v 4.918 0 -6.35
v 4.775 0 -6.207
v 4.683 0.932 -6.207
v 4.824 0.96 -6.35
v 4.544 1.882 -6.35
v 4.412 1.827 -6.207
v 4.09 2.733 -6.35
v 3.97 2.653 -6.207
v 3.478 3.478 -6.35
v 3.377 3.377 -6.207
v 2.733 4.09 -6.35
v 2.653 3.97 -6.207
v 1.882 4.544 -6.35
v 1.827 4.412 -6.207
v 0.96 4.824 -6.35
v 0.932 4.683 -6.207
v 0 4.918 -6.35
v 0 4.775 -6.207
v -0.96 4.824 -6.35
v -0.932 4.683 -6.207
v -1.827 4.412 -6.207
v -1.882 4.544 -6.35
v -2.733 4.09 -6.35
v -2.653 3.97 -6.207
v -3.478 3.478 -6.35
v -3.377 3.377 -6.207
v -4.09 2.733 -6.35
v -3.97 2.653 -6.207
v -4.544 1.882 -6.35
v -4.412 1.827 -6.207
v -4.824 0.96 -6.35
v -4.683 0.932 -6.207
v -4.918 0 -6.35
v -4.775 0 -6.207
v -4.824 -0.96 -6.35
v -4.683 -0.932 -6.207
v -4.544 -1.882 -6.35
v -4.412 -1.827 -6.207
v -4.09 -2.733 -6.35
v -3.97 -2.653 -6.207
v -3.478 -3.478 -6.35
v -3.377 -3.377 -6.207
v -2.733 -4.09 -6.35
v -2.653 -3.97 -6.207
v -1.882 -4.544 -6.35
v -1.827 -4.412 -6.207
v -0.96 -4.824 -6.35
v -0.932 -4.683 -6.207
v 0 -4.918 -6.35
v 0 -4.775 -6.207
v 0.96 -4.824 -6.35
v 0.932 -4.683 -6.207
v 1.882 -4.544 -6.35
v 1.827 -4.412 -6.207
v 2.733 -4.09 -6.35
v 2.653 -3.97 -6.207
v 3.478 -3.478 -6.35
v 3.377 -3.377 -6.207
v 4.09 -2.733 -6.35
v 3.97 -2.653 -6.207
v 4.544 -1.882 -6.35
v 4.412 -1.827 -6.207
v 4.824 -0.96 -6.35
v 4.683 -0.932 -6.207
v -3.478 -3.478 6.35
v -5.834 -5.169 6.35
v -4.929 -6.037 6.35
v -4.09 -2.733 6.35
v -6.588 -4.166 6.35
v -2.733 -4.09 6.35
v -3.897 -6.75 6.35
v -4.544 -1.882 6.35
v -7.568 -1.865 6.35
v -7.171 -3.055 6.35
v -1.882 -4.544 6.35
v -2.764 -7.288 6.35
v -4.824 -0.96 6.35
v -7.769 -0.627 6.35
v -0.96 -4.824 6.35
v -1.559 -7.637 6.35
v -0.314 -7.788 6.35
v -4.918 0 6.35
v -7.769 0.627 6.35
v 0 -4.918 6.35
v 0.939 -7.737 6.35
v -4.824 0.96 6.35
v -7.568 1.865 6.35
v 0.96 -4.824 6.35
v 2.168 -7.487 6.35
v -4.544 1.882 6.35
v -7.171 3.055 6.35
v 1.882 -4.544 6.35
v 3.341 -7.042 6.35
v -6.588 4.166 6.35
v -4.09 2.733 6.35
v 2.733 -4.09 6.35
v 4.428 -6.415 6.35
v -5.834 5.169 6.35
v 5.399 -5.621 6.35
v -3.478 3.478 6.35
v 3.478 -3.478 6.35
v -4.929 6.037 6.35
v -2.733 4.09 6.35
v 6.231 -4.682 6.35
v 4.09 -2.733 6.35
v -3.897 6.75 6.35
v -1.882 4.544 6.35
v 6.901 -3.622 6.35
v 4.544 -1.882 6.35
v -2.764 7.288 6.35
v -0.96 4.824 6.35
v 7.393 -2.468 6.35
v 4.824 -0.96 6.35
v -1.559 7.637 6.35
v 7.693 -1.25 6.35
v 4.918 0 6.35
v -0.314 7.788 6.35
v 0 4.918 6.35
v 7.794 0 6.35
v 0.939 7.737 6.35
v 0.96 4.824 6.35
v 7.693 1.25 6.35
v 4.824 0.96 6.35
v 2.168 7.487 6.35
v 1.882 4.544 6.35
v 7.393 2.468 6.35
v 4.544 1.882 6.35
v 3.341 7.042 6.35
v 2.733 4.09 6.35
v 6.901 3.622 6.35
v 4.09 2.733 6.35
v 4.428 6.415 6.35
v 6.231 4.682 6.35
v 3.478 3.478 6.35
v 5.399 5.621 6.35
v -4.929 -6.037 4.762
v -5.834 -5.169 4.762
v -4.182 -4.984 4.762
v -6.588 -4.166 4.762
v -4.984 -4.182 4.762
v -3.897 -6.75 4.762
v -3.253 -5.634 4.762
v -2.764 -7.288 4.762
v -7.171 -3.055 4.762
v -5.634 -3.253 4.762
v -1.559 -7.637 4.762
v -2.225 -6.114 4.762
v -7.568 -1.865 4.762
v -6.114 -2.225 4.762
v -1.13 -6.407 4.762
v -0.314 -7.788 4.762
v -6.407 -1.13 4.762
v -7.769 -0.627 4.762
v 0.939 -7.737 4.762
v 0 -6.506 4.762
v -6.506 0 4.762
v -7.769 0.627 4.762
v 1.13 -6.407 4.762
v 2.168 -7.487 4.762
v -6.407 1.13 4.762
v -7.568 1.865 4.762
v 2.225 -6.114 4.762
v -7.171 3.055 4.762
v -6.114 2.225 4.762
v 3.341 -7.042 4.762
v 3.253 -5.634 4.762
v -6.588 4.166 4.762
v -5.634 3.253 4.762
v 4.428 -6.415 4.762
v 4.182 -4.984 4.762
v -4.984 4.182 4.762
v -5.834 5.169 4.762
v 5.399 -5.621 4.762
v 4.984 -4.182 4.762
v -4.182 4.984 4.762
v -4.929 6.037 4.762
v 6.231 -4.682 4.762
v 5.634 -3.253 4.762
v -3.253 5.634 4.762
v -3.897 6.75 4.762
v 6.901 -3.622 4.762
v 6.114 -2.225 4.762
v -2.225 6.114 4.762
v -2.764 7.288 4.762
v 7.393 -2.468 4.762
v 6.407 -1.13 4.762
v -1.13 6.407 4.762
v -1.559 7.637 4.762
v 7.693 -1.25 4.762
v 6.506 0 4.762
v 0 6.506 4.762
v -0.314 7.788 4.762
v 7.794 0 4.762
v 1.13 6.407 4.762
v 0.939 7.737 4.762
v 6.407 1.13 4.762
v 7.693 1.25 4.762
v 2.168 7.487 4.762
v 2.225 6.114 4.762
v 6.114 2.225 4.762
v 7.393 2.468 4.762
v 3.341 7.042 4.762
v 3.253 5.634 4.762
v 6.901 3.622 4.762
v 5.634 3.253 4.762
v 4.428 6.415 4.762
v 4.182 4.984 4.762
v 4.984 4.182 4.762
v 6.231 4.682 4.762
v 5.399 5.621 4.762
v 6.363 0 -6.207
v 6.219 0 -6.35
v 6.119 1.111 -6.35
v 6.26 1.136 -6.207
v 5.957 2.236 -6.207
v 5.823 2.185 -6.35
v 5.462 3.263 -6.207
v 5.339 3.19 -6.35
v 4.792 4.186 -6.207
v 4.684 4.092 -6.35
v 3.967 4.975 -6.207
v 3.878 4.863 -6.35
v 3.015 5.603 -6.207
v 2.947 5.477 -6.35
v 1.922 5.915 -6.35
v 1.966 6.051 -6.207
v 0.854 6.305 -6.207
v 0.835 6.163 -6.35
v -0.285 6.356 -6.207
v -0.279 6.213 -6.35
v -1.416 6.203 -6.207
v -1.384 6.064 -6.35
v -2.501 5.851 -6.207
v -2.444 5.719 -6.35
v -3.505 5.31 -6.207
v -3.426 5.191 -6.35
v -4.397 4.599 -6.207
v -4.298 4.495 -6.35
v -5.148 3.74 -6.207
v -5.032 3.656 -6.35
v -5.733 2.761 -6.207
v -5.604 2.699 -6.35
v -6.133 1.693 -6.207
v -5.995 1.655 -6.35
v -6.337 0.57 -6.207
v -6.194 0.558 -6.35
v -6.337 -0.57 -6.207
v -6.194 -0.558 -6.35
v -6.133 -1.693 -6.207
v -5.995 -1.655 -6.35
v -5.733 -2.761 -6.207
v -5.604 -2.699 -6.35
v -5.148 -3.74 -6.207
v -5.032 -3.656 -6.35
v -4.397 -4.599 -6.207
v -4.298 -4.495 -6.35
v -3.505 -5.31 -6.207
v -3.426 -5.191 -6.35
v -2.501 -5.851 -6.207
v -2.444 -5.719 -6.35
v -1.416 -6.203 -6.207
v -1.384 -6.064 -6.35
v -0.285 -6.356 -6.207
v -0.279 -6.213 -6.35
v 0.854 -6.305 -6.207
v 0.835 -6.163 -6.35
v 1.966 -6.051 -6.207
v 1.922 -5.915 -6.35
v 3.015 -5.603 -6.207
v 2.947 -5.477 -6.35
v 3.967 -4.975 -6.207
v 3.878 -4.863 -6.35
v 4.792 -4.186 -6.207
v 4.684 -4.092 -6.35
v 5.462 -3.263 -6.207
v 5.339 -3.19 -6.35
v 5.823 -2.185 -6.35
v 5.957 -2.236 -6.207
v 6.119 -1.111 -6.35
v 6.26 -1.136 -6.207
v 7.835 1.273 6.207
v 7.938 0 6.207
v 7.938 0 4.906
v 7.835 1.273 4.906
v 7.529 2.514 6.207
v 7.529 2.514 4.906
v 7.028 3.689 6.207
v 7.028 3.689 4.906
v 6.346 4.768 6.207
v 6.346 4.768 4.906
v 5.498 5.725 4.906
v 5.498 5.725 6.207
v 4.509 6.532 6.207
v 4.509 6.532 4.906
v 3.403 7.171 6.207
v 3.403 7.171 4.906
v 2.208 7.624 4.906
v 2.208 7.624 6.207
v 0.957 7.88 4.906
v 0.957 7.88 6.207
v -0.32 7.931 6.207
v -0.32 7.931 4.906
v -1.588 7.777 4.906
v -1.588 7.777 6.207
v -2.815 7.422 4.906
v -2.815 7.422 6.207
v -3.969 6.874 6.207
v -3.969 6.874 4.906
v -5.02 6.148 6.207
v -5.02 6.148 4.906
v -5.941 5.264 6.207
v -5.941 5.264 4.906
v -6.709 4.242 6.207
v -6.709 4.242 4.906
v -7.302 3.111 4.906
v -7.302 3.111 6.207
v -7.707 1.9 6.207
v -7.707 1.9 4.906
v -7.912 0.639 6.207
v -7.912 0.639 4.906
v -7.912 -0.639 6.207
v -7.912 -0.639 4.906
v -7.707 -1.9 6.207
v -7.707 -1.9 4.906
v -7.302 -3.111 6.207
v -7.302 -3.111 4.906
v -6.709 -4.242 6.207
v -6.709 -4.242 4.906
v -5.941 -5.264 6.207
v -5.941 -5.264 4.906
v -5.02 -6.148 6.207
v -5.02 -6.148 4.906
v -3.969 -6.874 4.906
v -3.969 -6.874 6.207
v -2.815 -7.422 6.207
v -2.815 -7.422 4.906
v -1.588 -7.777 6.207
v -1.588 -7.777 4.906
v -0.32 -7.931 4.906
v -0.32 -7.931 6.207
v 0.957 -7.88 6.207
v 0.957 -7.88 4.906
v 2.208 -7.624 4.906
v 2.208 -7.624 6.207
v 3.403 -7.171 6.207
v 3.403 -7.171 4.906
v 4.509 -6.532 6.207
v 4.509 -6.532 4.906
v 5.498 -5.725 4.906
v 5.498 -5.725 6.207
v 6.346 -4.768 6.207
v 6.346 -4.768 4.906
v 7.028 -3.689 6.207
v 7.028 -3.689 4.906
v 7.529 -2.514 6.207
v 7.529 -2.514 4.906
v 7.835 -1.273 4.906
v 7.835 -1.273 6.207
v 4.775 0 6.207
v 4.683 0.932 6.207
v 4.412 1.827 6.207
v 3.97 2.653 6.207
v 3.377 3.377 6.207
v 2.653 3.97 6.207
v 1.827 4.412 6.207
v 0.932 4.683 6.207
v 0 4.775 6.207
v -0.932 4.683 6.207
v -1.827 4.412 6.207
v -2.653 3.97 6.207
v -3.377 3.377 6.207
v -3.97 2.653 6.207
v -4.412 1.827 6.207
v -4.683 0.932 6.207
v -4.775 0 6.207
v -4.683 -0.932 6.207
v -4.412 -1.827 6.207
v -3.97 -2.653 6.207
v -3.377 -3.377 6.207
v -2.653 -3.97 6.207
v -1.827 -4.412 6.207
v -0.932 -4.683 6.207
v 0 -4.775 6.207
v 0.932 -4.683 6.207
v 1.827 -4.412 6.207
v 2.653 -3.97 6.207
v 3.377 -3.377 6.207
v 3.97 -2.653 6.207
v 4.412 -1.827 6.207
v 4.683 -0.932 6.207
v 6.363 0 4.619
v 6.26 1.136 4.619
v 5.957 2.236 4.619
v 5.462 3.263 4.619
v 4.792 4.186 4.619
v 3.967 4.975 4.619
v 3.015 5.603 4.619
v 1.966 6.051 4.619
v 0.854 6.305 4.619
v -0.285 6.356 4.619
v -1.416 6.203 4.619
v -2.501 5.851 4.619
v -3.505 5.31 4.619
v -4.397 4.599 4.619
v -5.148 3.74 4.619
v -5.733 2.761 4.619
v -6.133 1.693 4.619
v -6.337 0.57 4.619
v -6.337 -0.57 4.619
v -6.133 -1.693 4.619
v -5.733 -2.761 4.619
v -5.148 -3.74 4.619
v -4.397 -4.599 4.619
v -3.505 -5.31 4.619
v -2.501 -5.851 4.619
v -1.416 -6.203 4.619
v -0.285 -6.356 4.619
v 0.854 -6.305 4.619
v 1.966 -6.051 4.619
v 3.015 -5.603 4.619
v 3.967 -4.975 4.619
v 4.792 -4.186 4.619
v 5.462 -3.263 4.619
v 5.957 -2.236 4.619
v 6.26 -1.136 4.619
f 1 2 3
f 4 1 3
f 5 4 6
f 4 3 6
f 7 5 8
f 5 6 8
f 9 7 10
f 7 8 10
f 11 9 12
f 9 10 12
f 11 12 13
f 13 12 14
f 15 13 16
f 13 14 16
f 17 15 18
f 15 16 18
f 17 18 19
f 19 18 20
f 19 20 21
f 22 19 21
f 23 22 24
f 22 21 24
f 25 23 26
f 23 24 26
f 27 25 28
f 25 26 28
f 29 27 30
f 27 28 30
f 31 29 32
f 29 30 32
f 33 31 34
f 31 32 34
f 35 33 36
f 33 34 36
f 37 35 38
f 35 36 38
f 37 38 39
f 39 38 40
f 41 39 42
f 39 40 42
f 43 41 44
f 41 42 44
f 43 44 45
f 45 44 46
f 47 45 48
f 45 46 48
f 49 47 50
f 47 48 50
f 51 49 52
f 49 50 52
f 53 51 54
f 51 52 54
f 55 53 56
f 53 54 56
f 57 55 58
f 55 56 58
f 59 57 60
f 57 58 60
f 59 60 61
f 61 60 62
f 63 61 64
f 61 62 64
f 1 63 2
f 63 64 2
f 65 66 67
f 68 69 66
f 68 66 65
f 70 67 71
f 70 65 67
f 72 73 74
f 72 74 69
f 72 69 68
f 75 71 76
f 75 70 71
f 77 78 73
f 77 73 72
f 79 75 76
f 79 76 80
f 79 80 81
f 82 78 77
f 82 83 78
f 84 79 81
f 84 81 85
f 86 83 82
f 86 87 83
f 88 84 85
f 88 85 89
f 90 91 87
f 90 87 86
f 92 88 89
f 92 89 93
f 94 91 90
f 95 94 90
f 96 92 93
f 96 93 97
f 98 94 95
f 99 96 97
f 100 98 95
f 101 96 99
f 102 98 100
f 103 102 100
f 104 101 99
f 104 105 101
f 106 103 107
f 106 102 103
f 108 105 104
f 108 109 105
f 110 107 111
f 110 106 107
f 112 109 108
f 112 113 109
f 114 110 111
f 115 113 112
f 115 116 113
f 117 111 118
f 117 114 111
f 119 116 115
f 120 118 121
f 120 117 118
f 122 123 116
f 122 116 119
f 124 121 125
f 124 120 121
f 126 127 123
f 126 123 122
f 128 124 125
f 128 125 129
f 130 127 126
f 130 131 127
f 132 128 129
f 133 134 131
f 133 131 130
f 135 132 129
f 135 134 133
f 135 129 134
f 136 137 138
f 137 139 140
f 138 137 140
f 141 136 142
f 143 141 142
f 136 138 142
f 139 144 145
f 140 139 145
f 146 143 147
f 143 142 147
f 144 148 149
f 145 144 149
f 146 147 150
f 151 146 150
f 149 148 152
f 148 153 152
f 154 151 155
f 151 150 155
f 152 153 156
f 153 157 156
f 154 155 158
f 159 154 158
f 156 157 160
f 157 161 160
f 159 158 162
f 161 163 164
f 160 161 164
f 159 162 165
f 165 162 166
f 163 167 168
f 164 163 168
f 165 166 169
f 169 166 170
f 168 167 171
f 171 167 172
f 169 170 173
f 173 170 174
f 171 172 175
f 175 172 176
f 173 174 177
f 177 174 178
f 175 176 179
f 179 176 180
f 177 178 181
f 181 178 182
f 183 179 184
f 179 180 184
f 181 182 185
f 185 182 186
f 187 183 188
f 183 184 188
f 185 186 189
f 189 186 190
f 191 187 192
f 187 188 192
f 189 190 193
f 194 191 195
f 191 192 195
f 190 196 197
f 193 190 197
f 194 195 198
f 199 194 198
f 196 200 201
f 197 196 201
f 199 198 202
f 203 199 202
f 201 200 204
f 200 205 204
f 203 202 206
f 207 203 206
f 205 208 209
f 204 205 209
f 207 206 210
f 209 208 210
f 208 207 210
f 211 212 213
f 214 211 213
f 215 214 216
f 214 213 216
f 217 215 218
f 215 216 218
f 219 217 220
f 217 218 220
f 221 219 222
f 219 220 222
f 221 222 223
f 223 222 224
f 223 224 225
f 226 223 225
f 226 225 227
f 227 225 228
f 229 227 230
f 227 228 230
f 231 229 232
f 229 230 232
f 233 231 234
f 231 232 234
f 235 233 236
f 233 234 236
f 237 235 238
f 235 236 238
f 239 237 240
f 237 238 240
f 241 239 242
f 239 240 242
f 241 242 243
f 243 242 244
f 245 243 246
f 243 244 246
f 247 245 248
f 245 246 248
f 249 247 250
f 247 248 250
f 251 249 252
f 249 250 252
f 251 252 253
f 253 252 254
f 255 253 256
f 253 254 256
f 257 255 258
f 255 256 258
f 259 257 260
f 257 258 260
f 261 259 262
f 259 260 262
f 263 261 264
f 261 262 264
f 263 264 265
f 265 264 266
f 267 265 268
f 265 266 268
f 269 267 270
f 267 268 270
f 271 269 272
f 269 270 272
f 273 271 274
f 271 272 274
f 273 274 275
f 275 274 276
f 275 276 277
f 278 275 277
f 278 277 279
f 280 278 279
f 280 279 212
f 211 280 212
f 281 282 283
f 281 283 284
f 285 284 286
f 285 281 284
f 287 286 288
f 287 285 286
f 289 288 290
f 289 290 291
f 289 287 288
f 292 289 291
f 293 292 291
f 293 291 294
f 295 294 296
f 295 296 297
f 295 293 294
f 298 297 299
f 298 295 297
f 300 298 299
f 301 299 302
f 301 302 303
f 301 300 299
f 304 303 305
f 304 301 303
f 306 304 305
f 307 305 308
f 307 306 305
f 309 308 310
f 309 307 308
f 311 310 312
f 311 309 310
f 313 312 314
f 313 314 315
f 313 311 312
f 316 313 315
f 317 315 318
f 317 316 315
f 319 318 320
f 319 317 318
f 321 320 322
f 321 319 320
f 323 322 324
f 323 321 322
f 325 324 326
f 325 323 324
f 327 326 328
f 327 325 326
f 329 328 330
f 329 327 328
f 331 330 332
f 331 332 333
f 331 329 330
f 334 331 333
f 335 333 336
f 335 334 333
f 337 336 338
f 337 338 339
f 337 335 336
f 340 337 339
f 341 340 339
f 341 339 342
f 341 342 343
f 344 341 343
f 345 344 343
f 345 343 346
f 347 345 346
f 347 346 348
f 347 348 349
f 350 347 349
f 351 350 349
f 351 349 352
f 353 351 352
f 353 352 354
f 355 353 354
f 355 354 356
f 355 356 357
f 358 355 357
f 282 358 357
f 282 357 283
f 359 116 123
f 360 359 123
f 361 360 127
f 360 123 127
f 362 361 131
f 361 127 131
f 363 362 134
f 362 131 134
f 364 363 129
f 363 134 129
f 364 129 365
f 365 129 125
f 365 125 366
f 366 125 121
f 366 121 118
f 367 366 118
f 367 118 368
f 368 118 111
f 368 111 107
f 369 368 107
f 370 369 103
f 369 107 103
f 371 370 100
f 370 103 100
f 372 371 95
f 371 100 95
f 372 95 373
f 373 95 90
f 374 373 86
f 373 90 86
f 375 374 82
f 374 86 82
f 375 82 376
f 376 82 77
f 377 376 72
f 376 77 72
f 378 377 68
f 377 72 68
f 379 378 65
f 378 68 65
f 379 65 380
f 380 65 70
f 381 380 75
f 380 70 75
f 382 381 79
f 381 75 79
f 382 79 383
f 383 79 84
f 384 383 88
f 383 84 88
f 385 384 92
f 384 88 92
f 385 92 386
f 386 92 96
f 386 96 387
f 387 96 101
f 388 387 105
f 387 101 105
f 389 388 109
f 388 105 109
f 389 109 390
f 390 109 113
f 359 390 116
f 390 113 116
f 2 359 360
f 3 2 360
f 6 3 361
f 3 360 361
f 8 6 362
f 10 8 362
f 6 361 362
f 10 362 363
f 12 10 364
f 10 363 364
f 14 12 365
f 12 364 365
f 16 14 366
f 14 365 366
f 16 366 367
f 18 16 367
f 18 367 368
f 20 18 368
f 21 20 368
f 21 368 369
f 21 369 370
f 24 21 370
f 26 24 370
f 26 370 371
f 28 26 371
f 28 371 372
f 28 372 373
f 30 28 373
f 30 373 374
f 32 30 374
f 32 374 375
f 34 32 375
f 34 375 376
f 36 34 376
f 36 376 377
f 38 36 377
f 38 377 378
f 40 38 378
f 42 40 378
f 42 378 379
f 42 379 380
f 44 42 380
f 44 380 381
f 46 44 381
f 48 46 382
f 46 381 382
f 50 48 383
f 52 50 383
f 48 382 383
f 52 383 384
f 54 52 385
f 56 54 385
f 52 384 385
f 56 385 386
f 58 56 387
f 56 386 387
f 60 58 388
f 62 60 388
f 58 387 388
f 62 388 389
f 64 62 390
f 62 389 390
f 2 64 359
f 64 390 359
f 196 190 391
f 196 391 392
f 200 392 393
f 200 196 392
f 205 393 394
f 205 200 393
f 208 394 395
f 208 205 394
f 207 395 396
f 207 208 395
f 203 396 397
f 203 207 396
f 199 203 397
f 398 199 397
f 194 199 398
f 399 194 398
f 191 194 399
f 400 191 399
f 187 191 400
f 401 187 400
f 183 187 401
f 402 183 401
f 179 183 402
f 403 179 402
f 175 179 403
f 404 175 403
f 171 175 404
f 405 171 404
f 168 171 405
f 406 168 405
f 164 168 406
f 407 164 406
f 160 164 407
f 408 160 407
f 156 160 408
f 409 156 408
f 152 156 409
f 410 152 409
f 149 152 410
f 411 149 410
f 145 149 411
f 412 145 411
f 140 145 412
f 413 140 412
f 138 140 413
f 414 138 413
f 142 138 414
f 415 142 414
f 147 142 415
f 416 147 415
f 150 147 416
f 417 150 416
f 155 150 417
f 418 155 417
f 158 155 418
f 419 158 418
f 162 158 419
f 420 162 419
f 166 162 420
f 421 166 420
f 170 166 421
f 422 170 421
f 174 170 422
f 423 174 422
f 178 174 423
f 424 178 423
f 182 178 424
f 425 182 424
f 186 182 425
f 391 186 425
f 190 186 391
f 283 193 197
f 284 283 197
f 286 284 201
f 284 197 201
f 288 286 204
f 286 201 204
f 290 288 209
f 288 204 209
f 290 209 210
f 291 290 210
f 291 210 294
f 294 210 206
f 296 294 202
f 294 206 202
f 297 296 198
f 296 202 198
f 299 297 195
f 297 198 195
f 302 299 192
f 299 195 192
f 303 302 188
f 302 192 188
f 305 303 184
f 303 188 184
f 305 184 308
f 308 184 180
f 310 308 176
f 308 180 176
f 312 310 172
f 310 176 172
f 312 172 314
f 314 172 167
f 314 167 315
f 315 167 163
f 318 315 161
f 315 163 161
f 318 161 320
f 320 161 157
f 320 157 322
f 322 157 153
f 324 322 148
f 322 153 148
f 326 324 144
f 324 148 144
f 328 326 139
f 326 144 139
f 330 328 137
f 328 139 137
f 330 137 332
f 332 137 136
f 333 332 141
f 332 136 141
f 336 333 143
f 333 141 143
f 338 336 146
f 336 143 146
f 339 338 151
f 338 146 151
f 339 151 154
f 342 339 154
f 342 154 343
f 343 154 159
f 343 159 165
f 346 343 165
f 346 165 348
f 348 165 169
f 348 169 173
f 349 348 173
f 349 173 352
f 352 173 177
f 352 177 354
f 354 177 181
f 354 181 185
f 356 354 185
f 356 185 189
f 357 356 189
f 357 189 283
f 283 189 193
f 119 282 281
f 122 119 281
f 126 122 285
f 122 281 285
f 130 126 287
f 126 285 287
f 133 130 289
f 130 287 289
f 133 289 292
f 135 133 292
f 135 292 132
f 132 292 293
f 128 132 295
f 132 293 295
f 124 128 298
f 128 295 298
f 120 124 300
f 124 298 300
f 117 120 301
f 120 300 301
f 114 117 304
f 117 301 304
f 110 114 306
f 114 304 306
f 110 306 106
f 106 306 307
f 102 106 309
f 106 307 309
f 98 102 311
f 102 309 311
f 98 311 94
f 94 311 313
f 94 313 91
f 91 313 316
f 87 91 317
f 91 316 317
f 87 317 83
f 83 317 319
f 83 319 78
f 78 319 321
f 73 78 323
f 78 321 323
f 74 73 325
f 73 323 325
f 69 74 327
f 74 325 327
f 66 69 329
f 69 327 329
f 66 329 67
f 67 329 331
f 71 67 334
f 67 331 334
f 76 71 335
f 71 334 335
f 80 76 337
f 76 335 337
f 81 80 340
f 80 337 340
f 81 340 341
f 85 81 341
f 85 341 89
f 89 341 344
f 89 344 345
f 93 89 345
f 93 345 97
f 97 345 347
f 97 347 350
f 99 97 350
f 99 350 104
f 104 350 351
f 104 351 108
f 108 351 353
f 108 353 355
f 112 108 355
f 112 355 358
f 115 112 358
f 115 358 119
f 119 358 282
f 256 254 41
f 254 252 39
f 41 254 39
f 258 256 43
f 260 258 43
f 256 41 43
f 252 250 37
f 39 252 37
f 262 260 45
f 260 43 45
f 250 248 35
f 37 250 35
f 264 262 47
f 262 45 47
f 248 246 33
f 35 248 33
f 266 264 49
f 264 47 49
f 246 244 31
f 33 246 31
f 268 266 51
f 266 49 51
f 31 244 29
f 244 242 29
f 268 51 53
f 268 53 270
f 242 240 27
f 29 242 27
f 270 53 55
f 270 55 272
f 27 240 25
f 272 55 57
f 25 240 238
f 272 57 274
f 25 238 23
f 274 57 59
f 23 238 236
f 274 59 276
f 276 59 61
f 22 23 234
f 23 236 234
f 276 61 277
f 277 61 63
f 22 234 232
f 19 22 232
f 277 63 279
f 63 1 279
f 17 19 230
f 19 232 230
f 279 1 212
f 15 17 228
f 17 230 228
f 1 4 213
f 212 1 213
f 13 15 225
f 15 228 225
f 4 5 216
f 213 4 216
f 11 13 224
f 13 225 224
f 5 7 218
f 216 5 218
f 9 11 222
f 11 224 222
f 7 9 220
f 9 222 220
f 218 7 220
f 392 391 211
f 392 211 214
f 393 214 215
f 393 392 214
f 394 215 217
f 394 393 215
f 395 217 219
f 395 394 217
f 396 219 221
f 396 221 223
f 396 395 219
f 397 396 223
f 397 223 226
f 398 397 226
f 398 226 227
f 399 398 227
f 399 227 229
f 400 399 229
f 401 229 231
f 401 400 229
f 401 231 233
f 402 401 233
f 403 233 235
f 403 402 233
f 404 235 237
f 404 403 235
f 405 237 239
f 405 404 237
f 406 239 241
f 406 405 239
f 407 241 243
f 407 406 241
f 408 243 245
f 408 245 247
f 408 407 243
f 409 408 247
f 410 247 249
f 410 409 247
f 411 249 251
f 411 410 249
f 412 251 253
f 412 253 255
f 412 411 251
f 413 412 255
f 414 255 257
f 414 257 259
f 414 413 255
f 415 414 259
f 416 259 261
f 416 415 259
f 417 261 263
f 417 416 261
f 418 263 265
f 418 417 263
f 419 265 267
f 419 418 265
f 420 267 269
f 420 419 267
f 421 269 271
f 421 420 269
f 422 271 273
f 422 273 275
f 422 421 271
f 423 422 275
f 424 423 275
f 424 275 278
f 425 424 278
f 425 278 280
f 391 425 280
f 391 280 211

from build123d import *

# Parameters (mm, degrees)
BOSS_EXTRUDE1_START = 6.35
SKETCH3_R           = 7.9375
SKETCH3_R_2         = 4.7752
BOSS_EXTRUDE1_DEPTH = 1.5875
BOSS_EXTRUDE2_START = 4.7625
SKETCH4_R           = 6.3627
SKETCH4_R_2         = 4.7752
BOSS_EXTRUDE2_DEPTH = 11.1125
CHAMFER1_SIZE       = 0.143256


with BuildPart() as part:
    # Sketch3 → Boss-Extrude1 (new body)
    with BuildSketch(Plane.XY.offset(BOSS_EXTRUDE1_START)):
        Circle(SKETCH3_R)
        Circle(SKETCH3_R_2, mode=Mode.SUBTRACT)
    extrude(amount=-BOSS_EXTRUDE1_DEPTH)

    # Sketch4 → Boss-Extrude2 (add)
    with BuildSketch(Plane.XY.offset(BOSS_EXTRUDE2_START)):
        Circle(SKETCH4_R)
        Circle(SKETCH4_R_2, mode=Mode.SUBTRACT)
    extrude(amount=-BOSS_EXTRUDE2_DEPTH)

    # Chamfer1
    chamfer1_edges = [part.edges().sort_by_distance(p)[0] for p in [
        (-4.7752, 0, -6.35),
        (-6.3627, 0, 4.7625),
        (-7.9375, 0, 6.35),
        (-7.9375, 0, 4.7625),
        (-4.7752, 0, 6.35),
        (-6.3627, 0, -6.35),
    ]]
    chamfer(chamfer1_edges, length=CHAMFER1_SIZE)


solid = part.part
